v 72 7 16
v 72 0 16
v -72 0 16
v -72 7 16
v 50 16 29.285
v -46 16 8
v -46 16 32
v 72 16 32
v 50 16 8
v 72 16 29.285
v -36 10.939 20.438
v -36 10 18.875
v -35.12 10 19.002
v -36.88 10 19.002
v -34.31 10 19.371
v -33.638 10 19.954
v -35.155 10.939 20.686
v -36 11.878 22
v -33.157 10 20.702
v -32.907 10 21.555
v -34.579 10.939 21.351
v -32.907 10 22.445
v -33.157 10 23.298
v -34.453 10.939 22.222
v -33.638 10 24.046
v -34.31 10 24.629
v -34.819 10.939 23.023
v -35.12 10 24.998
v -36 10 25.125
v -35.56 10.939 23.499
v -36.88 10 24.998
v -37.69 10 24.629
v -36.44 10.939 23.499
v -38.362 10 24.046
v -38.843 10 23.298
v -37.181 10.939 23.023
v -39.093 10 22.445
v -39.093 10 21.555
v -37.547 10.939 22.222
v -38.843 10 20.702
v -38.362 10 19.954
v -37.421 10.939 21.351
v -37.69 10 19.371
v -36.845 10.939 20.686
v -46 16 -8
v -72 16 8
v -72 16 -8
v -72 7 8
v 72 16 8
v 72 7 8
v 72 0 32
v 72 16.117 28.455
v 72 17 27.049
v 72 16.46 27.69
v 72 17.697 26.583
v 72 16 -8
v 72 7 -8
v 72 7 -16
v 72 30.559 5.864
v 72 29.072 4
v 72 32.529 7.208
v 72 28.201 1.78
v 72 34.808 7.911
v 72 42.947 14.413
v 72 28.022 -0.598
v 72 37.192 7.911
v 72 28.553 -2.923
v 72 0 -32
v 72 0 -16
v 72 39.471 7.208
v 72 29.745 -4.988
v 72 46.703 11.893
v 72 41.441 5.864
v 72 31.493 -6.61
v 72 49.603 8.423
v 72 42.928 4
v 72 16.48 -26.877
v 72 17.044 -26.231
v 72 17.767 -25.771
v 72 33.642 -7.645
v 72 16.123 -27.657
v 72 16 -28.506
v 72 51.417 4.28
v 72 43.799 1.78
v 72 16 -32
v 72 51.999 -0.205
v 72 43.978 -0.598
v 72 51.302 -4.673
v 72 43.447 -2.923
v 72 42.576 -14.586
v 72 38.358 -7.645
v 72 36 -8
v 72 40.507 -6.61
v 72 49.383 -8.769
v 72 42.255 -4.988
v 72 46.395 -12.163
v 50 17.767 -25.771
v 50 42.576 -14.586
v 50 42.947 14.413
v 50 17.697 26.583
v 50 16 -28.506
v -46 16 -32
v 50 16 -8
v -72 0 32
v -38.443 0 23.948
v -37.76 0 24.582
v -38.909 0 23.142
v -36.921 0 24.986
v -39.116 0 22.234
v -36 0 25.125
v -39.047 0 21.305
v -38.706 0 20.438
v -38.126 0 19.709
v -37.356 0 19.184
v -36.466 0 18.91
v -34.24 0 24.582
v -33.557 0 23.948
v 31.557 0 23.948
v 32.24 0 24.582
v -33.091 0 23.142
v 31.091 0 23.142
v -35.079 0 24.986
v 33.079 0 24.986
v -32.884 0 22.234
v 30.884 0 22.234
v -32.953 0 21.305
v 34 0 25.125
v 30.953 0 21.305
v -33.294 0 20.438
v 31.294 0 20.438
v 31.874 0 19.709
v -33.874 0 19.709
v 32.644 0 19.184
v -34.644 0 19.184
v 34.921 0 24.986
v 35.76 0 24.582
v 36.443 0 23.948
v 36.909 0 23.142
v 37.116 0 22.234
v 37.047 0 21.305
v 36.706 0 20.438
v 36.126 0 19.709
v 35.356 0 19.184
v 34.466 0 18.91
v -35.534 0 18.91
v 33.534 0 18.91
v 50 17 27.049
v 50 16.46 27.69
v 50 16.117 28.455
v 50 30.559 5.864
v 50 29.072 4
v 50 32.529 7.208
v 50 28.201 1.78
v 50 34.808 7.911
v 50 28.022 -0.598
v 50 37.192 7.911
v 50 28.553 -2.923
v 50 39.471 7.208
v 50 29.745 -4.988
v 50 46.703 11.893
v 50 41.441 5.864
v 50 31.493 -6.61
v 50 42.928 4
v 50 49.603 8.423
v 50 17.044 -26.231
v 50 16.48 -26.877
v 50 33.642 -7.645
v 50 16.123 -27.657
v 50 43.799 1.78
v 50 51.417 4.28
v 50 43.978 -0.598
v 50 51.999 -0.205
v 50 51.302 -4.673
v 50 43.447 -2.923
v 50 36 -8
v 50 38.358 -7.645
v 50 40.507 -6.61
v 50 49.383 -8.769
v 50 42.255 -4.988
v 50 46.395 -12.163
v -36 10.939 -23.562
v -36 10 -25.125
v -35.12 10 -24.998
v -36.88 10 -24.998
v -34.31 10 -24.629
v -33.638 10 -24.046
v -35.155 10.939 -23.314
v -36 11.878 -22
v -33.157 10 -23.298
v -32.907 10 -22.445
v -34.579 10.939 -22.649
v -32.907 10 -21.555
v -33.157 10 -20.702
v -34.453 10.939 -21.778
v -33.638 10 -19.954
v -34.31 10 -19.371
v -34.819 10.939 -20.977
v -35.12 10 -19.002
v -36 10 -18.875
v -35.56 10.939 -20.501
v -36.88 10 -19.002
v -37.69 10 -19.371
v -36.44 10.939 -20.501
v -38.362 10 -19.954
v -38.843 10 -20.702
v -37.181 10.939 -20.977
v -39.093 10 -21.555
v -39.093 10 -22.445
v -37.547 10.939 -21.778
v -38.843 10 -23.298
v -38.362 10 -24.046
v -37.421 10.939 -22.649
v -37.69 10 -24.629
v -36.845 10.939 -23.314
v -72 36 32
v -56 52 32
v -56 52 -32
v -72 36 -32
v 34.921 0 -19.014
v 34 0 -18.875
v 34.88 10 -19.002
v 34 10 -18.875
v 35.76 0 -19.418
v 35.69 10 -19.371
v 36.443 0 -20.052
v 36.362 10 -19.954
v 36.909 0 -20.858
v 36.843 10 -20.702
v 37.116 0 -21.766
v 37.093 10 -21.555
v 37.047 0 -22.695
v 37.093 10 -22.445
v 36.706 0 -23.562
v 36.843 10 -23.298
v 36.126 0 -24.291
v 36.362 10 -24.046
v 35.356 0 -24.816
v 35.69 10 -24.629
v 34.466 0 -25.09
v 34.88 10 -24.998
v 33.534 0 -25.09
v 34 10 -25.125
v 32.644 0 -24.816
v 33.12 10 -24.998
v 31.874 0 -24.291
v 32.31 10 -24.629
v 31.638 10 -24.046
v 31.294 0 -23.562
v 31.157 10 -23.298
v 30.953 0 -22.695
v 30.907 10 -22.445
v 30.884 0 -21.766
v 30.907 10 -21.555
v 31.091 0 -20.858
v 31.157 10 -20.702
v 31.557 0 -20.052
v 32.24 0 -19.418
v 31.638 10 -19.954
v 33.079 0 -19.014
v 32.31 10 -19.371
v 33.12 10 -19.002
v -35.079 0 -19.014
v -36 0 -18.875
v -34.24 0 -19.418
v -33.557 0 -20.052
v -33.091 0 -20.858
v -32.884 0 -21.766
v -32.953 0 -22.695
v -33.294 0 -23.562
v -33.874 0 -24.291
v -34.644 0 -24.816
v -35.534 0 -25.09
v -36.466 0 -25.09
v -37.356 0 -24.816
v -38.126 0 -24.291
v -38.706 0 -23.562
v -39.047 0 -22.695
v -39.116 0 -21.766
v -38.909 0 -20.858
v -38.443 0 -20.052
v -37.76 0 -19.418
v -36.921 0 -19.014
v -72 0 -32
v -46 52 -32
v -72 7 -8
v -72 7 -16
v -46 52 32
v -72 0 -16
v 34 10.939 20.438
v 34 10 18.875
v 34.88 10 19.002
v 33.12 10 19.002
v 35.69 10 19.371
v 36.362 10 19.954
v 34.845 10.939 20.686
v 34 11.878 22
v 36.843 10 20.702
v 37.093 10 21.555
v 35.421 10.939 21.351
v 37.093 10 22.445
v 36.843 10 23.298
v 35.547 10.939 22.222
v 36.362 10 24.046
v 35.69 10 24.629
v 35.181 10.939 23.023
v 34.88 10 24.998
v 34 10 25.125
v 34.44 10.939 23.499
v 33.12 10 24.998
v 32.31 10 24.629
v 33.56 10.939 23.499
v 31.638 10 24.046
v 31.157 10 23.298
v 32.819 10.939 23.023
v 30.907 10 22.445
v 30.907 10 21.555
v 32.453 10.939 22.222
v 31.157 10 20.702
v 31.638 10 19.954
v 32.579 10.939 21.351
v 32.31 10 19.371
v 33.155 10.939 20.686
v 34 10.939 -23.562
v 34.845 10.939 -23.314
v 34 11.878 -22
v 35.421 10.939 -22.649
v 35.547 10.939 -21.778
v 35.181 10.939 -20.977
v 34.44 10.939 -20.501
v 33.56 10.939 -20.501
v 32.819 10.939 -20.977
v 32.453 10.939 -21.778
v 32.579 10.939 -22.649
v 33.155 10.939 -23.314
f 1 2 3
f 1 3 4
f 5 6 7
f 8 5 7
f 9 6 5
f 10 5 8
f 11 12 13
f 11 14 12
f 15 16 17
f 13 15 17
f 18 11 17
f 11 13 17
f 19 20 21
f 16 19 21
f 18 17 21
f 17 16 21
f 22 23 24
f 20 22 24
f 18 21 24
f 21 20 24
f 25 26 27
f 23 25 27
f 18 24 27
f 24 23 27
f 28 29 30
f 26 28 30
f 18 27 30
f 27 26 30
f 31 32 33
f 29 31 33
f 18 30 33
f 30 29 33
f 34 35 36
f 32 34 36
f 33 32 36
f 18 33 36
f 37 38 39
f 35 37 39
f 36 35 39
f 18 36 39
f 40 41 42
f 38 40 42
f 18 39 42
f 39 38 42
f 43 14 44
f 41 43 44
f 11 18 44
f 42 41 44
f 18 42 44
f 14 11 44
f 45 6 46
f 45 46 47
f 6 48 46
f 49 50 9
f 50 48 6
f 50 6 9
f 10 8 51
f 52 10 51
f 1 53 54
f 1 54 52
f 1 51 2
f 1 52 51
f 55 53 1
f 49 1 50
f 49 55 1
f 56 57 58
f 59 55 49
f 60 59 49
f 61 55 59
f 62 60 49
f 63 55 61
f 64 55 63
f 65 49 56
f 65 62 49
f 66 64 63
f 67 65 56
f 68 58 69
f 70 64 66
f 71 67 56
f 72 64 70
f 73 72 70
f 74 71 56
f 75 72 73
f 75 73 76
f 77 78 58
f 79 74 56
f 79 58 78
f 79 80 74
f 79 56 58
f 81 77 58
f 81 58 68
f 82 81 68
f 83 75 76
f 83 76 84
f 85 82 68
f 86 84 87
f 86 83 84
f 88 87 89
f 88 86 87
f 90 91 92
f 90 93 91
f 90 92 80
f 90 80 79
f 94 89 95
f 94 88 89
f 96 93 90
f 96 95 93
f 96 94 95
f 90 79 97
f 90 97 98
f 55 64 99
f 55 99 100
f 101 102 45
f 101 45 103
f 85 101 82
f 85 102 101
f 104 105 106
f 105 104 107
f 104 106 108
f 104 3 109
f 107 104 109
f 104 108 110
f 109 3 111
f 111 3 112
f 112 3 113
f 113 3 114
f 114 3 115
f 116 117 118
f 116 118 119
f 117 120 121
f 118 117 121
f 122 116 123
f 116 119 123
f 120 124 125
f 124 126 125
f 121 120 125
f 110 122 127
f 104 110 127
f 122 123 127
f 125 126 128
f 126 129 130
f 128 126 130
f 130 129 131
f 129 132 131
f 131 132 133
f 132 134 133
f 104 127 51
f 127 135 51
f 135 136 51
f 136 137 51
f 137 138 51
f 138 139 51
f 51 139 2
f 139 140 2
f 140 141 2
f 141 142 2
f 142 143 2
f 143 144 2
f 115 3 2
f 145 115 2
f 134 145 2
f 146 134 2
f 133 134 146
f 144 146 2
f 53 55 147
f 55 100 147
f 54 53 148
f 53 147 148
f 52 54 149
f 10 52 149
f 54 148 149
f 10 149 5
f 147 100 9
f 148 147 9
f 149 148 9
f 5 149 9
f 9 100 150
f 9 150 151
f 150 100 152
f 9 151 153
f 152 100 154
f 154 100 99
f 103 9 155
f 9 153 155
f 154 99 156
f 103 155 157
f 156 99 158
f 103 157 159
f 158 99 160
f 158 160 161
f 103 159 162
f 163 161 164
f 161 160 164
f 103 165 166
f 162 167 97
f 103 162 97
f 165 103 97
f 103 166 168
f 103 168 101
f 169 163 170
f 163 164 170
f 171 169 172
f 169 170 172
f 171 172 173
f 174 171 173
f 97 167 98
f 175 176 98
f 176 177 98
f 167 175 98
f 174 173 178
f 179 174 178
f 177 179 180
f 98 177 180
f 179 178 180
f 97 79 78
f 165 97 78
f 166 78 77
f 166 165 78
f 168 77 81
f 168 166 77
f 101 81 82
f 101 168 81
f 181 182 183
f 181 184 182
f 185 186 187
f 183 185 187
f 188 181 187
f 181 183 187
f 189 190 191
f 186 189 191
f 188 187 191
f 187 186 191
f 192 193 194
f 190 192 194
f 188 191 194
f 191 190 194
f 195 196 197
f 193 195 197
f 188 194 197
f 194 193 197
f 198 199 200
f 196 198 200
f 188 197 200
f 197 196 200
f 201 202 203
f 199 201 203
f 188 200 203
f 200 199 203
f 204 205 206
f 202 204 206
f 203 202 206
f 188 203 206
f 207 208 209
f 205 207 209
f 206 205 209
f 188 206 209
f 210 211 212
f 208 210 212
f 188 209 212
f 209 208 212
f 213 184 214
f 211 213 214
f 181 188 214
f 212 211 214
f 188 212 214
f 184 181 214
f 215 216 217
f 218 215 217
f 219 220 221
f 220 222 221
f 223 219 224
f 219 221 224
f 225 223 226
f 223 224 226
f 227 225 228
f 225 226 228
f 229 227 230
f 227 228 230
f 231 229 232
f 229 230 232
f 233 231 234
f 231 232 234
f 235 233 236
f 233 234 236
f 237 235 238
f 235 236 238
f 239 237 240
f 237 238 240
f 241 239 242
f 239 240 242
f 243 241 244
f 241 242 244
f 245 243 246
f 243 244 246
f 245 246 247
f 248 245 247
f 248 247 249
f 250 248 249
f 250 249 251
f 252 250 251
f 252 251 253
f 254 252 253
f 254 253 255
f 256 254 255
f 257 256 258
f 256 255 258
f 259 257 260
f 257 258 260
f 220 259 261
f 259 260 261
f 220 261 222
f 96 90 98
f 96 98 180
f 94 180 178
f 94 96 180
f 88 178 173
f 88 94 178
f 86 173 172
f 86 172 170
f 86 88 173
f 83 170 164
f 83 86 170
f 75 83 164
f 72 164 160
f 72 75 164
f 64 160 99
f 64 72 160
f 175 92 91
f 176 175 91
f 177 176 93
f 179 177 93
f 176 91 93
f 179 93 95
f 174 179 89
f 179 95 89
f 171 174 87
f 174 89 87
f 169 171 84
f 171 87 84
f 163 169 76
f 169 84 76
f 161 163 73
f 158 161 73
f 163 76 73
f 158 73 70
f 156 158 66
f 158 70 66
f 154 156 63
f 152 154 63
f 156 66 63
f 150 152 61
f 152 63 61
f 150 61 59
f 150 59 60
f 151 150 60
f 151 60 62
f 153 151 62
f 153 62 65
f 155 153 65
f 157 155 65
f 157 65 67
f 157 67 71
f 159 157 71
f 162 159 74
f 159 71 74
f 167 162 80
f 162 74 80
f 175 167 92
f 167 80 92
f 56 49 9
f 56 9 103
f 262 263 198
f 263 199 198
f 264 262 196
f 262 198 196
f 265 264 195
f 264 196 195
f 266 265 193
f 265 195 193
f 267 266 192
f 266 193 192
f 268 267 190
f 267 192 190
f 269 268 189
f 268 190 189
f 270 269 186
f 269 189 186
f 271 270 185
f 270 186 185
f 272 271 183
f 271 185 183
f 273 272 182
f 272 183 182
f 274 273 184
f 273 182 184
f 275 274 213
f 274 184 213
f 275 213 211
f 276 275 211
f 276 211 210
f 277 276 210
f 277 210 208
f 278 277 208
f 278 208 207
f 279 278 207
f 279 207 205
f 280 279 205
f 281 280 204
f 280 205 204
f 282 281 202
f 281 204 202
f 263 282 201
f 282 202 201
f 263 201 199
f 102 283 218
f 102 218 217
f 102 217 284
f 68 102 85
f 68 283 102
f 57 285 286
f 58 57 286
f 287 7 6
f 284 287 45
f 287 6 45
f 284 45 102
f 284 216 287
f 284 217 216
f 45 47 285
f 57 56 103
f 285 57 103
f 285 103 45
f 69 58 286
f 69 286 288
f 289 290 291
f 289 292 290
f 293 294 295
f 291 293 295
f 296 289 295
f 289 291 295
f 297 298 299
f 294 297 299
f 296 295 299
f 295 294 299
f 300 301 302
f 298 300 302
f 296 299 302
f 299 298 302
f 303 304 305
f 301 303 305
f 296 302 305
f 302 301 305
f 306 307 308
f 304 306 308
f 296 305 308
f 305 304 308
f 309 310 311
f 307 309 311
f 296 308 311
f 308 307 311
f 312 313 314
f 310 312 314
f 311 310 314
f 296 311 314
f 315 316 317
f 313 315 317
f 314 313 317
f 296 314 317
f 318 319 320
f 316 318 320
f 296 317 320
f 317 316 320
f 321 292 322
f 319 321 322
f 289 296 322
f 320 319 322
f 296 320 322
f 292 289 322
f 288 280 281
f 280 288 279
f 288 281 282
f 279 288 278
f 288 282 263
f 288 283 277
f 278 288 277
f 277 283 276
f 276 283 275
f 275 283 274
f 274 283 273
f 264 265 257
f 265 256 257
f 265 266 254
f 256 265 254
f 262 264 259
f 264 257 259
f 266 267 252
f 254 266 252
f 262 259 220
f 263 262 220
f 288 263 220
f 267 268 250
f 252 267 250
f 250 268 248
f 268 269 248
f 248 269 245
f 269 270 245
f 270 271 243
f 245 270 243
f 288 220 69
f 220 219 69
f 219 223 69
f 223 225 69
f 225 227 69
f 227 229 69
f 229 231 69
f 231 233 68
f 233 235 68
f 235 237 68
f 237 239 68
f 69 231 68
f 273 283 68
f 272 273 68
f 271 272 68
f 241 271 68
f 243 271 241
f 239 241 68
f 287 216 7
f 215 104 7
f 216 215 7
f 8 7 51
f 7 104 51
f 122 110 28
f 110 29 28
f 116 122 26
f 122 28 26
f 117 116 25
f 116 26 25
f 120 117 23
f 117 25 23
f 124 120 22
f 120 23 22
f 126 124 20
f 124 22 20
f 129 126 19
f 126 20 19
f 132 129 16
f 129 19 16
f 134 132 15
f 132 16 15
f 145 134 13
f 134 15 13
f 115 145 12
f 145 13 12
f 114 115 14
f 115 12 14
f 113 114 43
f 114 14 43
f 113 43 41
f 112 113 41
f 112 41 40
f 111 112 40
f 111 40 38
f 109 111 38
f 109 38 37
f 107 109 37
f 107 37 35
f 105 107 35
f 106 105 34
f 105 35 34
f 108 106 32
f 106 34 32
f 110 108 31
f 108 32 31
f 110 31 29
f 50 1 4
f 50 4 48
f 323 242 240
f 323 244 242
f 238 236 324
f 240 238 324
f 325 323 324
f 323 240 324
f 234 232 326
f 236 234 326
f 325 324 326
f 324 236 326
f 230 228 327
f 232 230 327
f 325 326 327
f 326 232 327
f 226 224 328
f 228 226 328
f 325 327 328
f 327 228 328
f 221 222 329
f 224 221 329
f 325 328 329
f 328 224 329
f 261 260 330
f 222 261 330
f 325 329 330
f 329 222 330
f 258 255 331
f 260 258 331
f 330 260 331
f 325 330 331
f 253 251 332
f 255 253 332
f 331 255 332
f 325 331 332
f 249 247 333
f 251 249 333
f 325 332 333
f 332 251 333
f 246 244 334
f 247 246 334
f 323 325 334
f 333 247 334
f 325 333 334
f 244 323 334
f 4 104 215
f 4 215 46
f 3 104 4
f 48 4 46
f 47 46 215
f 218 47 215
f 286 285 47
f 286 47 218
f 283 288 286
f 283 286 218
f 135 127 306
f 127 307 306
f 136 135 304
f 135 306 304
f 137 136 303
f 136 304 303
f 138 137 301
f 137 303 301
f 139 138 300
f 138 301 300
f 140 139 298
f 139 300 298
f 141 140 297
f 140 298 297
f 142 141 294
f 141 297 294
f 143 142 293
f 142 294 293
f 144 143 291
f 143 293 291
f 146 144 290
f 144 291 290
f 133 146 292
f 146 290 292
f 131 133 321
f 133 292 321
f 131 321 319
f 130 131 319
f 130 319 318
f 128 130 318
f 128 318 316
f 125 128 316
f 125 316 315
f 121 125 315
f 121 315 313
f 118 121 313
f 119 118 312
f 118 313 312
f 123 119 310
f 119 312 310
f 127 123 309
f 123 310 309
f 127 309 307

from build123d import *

# Parameters (mm, degrees)
SKETCH1_W                        = 144
SKETCH1_H                        = 64
BOSS_EXTRUDE1_DEPTH              = 16
SKETCH3_W                        = 26
SKETCH3_H                        = 64
BOSS_EXTRUDE2_DEPTH              = 36
CHAMFER1_SIZE                    = 16
CUT_EXTRUDE1_REACH               = 146
SKETCH5_R                        = 8
BOSS_EXTRUDE3_DEPTH              = 22
FILLET1_R                        = 3
TAP_DRILL_FOR_M6_HELICOIL2_D     = 6.25
TAP_DRILL_FOR_M6_HELICOIL2_DEPTH = 10
TAP_DRILL_FOR_M6_HELICOIL2_TIP   = 1.877689434


with BuildPart() as part:
    # Sketch1 → Boss-Extrude1 (new body)
    with BuildSketch(Plane(origin=(0, 0, 0), x_dir=(1, 0, 0), z_dir=(0, 1, 0))):
        Rectangle(SKETCH1_W, SKETCH1_H)
    extrude(amount=BOSS_EXTRUDE1_DEPTH)

    # Sketch3 → Boss-Extrude2 (add)
    with BuildSketch(Plane(origin=(0, 16, 0), x_dir=(1, 0, 0), z_dir=(0, 1, 0))):
        with Locations((-59, 0)):
            Rectangle(SKETCH3_W, SKETCH3_H)
    extrude(amount=BOSS_EXTRUDE2_DEPTH)

    # Chamfer1
    chamfer1_edges = [part.edges().sort_by_distance(p)[0] for p in [
        (-72, 52, 0),
    ]]
    chamfer(chamfer1_edges, length=CHAMFER1_SIZE)

    # Sketch2 → Cut-Extrude1 (cut, up to next)
    with BuildSketch(Plane(origin=(72, 0, 0), x_dir=(0, 0, -1), z_dir=(1, 0, 0)), mode=Mode.PRIVATE) as cut_extrude1_sk1:
        Polygon((-16, 0), (-16, 7), (-8, 7), (-8, 16), (8, 16), (8, 7), (16, 7), (16, 0), align=None)
    cut_extrude1_tool1 = extrude(cut_extrude1_sk1.sketch, amount=-CUT_EXTRUDE1_REACH, mode=Mode.PRIVATE) & part.part
    add(cut_extrude1_tool1.solids().sort_by_distance((72, 6.630435, 0))[0], mode=Mode.SUBTRACT)

    # Sketch5 → Boss-Extrude3 (add)
    with BuildSketch(Plane(origin=(72, 0, 0), x_dir=(0, 0, -1), z_dir=(1, 0, 0))):
        with BuildLine():
            Line((-14.413228488, 42.946858611), (-27.401020705, 16))
            Line((-27.401020705, 16), (26.567243493, 16))
            Line((26.567243493, 16), (14.586247124, 42.575818949))
            ThreePointArc((14.586247124, 42.575818949), (0.204698485, 51.998690525), (-14.413228488, 42.946858611))
        make_face()
        with Locations((0, 36)):
            Circle(SKETCH5_R, mode=Mode.SUBTRACT)
    extrude(amount=-BOSS_EXTRUDE3_DEPTH)

    # Fillet1
    fillet1_edges = [part.edges().sort_by_distance(p)[0] for p in [
        (61, 16, -26.567243493),
        (61, 16, 27.401020705),
    ]]
    fillet(fillet1_edges, radius=FILLET1_R)

    # Tap Drill for M6 Helicoil2
    with Locations(Plane(origin=(-36, 0, 22), x_dir=(0, 0, -1), z_dir=(0, -1, 0))):
        with Locations((0, 0), (0, 70), (44, 0), (44, 70)):
            Hole(TAP_DRILL_FOR_M6_HELICOIL2_D / 2, depth=TAP_DRILL_FOR_M6_HELICOIL2_DEPTH)
            with Locations((0, 0, -(TAP_DRILL_FOR_M6_HELICOIL2_DEPTH + TAP_DRILL_FOR_M6_HELICOIL2_TIP / 2))):  # 118° drill point
                Cone(0, TAP_DRILL_FOR_M6_HELICOIL2_D / 2, TAP_DRILL_FOR_M6_HELICOIL2_TIP, mode=Mode.SUBTRACT)


solid = part.part
